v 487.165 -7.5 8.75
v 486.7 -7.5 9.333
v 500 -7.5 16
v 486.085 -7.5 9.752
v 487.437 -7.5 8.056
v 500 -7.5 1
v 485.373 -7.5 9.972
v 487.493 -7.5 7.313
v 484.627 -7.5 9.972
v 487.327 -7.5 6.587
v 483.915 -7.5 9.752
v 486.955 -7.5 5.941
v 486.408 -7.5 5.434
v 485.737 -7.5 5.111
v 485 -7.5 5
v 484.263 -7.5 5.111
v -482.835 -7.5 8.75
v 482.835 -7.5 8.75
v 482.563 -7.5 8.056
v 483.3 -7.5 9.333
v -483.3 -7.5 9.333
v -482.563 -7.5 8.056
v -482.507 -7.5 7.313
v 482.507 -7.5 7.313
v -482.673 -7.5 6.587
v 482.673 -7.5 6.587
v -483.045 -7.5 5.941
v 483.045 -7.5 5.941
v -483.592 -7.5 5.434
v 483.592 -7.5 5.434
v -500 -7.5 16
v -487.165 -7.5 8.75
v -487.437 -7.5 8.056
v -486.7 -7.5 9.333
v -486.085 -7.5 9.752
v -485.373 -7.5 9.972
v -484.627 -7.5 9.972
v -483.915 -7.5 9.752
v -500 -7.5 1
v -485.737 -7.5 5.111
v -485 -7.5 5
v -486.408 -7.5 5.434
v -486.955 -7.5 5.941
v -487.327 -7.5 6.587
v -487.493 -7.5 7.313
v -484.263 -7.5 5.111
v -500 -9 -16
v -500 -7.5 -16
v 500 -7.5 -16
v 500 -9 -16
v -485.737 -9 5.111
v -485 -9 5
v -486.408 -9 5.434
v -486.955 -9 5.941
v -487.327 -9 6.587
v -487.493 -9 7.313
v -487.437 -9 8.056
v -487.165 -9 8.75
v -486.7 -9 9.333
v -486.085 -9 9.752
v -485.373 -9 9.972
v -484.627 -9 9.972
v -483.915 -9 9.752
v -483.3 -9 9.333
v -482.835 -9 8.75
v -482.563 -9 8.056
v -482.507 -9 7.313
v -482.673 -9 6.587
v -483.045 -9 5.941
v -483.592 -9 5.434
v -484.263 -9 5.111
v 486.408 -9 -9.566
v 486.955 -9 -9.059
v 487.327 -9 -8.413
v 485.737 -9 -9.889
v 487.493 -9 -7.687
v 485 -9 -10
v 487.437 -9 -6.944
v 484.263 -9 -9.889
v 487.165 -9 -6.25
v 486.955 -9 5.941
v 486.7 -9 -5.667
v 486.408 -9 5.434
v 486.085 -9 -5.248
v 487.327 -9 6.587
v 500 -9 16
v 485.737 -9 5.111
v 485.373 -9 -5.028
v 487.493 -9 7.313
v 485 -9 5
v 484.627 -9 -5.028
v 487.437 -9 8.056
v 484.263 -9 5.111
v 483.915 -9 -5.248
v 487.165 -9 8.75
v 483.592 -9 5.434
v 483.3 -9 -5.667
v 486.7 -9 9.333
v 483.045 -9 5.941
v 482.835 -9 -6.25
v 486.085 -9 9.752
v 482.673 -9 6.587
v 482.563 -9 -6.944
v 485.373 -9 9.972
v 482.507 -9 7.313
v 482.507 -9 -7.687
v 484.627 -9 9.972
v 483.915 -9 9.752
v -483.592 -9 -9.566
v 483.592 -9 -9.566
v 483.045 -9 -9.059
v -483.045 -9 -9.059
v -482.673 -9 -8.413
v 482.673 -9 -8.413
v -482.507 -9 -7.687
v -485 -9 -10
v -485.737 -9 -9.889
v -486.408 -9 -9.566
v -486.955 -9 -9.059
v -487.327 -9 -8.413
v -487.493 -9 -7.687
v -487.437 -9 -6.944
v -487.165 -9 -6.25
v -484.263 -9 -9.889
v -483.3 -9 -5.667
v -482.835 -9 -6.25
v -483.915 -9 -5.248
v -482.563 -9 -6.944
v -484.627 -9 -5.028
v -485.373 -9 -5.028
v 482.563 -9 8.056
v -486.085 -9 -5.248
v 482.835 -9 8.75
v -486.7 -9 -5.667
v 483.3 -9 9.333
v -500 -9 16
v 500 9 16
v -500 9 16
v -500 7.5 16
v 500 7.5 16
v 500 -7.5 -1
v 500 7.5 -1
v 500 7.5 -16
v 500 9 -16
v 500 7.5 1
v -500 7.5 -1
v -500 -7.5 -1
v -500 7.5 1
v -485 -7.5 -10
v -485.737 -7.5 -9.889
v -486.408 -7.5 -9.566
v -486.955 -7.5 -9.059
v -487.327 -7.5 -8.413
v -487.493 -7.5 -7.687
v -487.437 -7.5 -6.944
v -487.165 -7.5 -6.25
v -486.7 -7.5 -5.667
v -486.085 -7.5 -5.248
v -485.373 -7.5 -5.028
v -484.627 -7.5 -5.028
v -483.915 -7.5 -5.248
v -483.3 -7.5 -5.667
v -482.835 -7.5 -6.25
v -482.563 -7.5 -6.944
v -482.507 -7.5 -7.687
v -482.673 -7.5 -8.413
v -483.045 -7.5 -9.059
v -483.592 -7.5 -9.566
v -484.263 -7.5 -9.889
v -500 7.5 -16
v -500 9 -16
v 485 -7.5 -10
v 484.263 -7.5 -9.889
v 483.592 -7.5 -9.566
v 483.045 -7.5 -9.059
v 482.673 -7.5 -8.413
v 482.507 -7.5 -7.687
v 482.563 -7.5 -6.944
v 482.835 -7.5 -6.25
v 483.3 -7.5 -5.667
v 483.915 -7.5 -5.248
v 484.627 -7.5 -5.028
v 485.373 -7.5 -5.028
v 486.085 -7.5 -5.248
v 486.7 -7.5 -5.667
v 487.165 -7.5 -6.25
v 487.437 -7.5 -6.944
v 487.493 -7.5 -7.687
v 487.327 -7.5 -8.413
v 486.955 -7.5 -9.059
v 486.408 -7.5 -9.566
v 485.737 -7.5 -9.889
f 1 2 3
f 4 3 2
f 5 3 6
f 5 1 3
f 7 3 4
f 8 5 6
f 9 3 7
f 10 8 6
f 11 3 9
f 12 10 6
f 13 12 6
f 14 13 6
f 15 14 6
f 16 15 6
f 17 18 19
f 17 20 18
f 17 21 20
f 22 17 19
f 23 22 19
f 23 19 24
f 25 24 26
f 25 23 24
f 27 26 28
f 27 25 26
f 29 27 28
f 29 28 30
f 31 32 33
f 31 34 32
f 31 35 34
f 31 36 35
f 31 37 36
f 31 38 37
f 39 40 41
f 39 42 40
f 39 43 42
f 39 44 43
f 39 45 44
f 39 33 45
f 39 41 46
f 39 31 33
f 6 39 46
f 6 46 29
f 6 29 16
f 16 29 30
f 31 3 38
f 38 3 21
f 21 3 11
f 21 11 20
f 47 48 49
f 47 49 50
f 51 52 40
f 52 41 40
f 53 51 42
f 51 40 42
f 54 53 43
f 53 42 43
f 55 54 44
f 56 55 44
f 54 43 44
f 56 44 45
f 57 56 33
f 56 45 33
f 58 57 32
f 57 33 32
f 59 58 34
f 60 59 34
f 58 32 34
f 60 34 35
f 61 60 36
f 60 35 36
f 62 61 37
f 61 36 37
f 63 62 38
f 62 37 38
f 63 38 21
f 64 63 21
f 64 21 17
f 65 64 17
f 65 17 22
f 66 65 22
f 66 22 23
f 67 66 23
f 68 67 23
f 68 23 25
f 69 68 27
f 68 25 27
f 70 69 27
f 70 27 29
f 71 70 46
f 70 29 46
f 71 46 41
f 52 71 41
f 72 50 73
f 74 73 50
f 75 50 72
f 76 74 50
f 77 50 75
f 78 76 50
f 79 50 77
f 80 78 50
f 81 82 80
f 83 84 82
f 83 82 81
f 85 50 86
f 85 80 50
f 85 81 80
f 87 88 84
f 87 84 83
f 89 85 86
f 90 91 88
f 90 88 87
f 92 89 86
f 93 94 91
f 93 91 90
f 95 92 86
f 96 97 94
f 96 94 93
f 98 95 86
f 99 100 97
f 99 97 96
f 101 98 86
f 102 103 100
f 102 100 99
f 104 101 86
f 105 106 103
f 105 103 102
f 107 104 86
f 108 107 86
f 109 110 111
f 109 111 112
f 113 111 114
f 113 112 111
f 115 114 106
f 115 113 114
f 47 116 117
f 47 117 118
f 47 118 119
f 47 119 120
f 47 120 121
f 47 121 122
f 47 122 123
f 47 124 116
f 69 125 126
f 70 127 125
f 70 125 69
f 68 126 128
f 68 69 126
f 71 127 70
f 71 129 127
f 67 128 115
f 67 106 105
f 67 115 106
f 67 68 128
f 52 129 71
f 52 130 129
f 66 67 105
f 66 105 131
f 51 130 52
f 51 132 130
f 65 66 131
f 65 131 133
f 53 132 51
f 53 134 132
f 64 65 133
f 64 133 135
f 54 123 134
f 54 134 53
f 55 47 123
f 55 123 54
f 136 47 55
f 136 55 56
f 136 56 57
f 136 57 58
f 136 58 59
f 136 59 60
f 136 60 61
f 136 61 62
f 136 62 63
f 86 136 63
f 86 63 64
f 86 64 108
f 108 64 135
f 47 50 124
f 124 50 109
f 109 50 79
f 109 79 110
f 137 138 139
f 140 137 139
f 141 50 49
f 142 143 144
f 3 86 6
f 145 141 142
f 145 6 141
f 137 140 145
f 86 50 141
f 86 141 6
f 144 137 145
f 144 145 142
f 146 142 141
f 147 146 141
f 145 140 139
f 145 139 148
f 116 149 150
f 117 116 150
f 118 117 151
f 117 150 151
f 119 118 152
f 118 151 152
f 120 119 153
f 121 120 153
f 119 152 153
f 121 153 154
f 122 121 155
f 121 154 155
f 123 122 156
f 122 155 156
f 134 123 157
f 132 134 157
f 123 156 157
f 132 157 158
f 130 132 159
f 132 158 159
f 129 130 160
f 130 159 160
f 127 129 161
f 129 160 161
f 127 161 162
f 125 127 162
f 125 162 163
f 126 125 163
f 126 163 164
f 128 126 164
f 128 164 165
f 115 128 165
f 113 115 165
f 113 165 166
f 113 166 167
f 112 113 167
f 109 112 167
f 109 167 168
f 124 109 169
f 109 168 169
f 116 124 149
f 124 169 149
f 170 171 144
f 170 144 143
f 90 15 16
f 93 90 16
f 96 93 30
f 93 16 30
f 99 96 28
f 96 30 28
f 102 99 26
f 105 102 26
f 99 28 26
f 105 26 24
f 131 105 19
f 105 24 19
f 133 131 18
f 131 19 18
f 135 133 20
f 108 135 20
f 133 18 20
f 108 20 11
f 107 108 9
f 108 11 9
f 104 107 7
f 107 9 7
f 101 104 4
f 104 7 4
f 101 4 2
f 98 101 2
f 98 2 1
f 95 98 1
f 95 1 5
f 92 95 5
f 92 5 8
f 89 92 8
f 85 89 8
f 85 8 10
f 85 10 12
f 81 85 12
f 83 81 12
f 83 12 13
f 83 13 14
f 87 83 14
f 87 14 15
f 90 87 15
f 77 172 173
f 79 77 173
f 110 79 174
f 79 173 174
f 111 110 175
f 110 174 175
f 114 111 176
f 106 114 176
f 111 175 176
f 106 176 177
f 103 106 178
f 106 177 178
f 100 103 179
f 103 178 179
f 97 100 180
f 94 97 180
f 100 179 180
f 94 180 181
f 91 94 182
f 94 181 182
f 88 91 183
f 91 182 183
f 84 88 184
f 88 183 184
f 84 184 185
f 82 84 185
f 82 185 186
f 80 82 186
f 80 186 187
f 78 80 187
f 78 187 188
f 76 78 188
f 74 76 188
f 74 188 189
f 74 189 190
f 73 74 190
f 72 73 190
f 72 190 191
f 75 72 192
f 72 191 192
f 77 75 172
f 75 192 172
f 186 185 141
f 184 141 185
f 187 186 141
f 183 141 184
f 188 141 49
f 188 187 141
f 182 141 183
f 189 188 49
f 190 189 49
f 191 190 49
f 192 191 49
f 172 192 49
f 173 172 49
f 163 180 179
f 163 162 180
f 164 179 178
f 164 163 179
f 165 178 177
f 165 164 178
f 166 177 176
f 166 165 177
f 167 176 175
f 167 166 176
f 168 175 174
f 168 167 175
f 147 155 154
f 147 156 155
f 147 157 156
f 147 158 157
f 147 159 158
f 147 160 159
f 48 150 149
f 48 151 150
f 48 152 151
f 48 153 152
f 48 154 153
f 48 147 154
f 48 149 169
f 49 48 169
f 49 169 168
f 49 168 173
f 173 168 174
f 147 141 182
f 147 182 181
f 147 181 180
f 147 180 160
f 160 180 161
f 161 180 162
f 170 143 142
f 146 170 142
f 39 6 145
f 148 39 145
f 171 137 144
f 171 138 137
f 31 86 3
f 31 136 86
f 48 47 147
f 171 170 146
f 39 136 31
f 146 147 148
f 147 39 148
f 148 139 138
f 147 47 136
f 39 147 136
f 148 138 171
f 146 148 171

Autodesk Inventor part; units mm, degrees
ref_plane "YZ Plane" through (0, 0, 0) normal (1, 0, 0) x (0, 1, 0)
ref_plane "XZ Plane" through (0, 0, 0) normal (0, 1, 0) x (-1, 0, 0)
ref_plane "XY Plane" through (0, 0, 0) normal (0, 0, 1) x (1, 0, 0)
sketch "Skizze1" plane through (0, 0, 0) normal (1, 0, 0) x (0, 1, 0)
  line L0 (9, 16) -> (9, -16)
  line L1 (9, -16) -> (7.5, -16)
  line L2 (7.5, -16) -> (7.5, -1)
  line L3 (7.5, -1) -> (-7.5, -1)
  line L4 (-7.5, -1) -> (-7.5, -16)
  line L5 (-7.5, -16) -> (-9, -16)
  line L6 (-9, -16) -> (-9, 16)
  line L7 (-9, 16) -> (-7.5, 16)
  line L8 (-7.5, 16) -> (-7.5, 1)
  line L9 (-7.5, 1) -> (7.5, 1)
  line L10 (9, 16) -> (7.5, 16)
  line L11 (7.5, 16) -> (7.5, 1)
  line L12 (0, 0) -> (9, 0) construction
  line L13 (0, 0) -> (-9, 0) construction
  line L14 (0, 0) -> (0, 16) construction
  line L15 (0, 0) -> (0, -16) construction
  dimension "d0" = 2
  dimension "d1" = 1.5
  dimension "d2" = 32
  dimension "d3" = 18
extrude "Extrusion1" add sketch "Skizze1" along normal mid plane 1000
sketch "Skizze2" plane through (-500, -9, 16) normal (0, 1, 0) x (1, 0, 0)
  line L0 (985, 23.5) -> (985, 8.5)
  line L1 (15, 23.5) -> (15, 8.5)
  line L2 (15, 16) -> (0, 16)
  line L3 (0, 0) -> (0, 32) projected
  line L4 (1000, 32) -> (1000, 0) projected
  line L5 (985, 16) -> (1000, 16)
  point P0 (500, 16)
  dimension "d6" = 15
  dimension "d8" = 15
  dimension "d9" = 15
  dimension "d17" = 8.5
  dimension "d18" = 15
hole "Bohrung1" at (485, -9, -7.5) at (485, -9, 7.5) at (-485, -9, -7.5) at (-485, -9, 7.5) direction (0, 1, 0) diameter 5 depth 1.5
properties part number "Träger" material "Aluminium 6061, Träger"
